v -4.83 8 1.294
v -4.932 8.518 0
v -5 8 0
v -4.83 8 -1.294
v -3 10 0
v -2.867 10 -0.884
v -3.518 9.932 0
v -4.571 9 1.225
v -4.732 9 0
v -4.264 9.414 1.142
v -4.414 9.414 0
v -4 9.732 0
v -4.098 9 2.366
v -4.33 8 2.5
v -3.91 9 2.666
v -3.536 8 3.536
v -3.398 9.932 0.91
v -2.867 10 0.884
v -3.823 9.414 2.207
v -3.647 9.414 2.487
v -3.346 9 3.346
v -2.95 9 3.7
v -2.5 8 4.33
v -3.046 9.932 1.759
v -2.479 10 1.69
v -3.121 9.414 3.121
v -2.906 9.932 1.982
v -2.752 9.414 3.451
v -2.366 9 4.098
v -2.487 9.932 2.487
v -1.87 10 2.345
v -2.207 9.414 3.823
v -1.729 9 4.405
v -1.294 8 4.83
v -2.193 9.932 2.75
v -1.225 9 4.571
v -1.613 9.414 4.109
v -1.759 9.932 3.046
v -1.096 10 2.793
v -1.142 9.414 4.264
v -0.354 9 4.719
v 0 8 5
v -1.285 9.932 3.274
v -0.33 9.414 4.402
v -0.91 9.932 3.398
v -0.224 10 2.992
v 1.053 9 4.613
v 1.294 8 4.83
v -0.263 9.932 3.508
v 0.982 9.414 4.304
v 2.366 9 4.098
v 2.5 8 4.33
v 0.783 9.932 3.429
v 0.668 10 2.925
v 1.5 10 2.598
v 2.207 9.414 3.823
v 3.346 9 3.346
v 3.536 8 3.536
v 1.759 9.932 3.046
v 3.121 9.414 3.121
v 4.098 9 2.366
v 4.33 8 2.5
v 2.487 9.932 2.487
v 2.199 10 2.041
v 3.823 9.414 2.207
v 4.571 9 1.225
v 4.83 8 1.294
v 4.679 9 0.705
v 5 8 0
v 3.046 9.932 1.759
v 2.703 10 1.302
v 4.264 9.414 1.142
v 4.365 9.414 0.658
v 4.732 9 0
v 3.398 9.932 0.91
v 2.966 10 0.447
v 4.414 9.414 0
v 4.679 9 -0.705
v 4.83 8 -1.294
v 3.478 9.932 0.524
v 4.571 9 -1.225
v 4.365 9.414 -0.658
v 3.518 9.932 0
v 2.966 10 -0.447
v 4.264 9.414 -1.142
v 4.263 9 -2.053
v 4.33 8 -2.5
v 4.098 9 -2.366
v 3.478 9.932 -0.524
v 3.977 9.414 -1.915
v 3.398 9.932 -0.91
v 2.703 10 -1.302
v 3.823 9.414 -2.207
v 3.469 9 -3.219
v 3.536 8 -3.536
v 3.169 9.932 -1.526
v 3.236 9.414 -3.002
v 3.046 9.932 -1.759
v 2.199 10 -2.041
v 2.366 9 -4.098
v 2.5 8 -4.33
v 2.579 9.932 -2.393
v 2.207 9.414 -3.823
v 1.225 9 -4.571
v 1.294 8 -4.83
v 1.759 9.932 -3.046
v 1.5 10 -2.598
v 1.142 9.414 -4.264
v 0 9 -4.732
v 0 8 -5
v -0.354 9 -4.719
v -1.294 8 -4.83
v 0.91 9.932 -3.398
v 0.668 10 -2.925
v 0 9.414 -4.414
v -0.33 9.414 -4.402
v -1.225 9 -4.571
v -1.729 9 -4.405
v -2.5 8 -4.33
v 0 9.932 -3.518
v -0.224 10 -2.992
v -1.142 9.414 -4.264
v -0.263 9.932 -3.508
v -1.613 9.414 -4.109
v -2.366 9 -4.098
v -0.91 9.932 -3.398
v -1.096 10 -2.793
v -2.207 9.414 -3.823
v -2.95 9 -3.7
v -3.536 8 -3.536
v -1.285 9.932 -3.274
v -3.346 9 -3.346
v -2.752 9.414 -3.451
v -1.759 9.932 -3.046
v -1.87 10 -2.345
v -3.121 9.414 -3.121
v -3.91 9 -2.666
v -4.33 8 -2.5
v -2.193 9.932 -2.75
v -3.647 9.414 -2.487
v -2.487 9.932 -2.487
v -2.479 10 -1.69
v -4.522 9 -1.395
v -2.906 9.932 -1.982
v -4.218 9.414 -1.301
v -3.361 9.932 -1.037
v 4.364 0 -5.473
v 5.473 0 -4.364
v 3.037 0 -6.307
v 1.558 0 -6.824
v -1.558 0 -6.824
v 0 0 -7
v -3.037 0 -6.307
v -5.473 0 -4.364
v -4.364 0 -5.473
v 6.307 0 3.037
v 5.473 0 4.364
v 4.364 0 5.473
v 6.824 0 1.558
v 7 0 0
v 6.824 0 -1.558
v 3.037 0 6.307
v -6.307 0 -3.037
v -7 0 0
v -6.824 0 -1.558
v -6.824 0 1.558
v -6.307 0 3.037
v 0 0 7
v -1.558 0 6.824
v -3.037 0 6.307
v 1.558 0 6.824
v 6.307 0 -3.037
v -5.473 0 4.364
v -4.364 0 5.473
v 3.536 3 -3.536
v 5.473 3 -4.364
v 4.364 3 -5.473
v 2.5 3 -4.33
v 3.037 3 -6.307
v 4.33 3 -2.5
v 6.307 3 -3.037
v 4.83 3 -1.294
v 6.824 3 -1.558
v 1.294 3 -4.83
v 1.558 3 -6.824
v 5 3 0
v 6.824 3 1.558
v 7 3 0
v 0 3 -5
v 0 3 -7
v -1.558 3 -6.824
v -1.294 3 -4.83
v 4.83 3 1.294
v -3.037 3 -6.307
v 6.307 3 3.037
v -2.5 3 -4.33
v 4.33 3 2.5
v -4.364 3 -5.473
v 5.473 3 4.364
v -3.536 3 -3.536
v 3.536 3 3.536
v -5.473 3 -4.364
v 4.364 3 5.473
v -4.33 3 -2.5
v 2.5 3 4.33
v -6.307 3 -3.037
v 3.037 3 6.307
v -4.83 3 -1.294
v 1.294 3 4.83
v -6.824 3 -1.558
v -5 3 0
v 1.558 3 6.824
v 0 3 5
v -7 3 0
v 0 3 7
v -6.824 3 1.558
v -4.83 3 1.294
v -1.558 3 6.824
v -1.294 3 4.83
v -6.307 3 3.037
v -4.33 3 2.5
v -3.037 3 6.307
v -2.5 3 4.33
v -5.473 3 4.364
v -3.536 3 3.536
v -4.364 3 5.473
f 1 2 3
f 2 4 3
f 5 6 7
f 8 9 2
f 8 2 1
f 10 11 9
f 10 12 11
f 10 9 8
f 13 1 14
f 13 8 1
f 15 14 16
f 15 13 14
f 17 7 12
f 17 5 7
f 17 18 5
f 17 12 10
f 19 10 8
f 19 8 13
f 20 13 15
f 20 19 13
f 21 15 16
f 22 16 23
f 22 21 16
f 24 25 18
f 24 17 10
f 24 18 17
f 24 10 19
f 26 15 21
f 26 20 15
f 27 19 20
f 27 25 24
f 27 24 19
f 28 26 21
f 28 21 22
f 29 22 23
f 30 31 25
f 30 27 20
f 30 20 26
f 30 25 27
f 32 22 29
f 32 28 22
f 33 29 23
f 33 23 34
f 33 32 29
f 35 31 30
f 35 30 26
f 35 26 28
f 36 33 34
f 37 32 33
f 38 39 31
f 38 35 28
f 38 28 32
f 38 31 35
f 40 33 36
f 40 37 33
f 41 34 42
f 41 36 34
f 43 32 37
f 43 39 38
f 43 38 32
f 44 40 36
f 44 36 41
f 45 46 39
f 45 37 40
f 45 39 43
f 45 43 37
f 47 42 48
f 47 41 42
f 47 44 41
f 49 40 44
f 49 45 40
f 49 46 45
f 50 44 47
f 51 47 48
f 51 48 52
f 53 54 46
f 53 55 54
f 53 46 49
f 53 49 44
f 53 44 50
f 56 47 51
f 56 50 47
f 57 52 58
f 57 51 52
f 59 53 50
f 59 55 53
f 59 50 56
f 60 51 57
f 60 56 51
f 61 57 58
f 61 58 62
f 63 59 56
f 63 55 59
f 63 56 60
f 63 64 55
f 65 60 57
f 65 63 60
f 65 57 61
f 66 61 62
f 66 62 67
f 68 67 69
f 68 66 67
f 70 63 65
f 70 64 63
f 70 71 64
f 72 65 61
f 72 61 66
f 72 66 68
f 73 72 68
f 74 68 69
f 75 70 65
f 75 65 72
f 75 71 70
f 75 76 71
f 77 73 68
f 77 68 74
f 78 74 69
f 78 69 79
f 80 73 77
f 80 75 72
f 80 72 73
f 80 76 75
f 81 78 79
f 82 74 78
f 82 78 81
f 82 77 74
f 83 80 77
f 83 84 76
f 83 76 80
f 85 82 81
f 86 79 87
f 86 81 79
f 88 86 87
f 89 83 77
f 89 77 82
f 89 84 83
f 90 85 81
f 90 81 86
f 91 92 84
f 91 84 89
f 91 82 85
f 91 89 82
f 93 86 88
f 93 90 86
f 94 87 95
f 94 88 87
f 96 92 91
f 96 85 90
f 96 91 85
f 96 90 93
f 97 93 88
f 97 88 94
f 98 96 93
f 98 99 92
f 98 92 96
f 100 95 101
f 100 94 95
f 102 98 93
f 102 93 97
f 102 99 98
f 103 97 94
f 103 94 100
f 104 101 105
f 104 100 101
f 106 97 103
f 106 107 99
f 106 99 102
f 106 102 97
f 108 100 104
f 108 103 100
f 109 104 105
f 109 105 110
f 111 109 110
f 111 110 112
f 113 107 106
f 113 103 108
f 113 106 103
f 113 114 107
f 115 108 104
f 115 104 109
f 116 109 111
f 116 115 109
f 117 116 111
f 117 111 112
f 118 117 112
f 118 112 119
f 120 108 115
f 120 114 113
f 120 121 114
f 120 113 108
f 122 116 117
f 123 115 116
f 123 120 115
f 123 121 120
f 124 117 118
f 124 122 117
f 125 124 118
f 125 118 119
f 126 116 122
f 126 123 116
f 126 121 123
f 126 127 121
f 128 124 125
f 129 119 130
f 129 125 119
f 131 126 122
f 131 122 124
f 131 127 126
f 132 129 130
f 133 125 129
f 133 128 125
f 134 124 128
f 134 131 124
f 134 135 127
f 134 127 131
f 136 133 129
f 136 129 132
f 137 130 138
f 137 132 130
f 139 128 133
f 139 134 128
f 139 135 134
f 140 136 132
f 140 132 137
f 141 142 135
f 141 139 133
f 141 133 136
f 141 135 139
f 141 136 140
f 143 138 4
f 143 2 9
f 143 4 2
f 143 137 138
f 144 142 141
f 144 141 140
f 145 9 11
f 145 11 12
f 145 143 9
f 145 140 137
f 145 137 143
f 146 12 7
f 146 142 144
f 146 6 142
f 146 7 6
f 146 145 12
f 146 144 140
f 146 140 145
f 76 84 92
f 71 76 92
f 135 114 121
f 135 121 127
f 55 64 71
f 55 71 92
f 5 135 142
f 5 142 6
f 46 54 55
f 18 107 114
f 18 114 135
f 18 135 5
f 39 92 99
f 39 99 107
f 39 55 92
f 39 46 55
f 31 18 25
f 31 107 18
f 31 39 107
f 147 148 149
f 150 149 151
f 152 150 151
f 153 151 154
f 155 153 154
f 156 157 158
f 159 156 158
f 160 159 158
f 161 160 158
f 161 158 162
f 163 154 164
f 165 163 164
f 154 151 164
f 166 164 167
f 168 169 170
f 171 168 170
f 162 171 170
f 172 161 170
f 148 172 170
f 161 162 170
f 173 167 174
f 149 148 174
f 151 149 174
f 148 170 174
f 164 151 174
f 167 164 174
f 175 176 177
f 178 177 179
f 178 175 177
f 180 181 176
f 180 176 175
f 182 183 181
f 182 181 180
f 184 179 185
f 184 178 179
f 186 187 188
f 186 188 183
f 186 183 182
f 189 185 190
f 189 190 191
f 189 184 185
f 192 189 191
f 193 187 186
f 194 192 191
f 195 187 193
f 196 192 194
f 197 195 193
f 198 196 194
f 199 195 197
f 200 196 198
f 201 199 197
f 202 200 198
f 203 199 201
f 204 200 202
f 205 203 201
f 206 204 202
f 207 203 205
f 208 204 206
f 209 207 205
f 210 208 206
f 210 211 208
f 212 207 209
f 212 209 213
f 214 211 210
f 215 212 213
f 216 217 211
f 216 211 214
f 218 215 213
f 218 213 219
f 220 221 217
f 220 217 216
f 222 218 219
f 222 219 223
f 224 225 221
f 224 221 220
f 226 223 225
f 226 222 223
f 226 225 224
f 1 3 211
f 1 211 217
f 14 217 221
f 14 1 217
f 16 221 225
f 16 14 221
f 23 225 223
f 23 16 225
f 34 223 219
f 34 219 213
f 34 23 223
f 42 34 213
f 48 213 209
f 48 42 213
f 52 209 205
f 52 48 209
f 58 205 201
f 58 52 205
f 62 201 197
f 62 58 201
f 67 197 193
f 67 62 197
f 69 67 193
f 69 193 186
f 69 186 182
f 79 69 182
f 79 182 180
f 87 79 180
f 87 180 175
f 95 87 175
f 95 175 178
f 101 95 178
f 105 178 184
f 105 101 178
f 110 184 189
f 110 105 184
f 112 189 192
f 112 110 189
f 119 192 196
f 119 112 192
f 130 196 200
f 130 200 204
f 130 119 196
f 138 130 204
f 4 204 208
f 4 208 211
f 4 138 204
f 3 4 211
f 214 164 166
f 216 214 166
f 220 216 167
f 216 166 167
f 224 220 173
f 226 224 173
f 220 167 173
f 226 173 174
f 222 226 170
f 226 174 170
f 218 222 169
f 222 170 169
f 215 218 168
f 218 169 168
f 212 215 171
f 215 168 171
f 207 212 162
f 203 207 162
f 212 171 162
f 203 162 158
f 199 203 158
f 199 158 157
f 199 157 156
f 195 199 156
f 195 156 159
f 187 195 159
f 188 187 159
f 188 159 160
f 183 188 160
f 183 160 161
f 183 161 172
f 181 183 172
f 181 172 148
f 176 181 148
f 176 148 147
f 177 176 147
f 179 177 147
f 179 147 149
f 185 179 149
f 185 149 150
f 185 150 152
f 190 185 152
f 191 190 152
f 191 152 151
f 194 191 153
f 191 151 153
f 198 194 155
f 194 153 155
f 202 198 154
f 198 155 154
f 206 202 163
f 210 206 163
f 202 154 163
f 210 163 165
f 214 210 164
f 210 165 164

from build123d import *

# Parameters (mm, degrees)
SKETCH_R             = 7
PAD_DEPTH            = 10
SKETCH001_R          = 7
SKETCH001_R_2        = 5
POCKET_DEPTH         = 7
FILLET_R             = 2
BODY_PLACEMENT_ANGLE = 180


with BuildPart() as part:
    # Sketch → Pad (new body)
    with BuildSketch(Plane.XZ):
        Circle(SKETCH_R)
    extrude(amount=PAD_DEPTH)

    # Sketch001 (on Face3 of Pad) → Pocket (cut)
    with BuildSketch(Plane.XZ.offset(10)):
        Circle(SKETCH001_R)
        Circle(SKETCH001_R_2, mode=Mode.SUBTRACT)
    extrude(amount=-POCKET_DEPTH, mode=Mode.SUBTRACT)

    # Fillet
    fillet_edges = [part.edges().sort_by_distance(p)[0] for p in [
        (-5, -10, 0),
    ]]
    fillet(fillet_edges, radius=FILLET_R)


with BuildPart() as part_1:
    # Body placement: moved
    add(part.part.rotate(Axis((0, 0, 0), (0, 0, 1)), BODY_PLACEMENT_ANGLE))


solid = part_1.part
